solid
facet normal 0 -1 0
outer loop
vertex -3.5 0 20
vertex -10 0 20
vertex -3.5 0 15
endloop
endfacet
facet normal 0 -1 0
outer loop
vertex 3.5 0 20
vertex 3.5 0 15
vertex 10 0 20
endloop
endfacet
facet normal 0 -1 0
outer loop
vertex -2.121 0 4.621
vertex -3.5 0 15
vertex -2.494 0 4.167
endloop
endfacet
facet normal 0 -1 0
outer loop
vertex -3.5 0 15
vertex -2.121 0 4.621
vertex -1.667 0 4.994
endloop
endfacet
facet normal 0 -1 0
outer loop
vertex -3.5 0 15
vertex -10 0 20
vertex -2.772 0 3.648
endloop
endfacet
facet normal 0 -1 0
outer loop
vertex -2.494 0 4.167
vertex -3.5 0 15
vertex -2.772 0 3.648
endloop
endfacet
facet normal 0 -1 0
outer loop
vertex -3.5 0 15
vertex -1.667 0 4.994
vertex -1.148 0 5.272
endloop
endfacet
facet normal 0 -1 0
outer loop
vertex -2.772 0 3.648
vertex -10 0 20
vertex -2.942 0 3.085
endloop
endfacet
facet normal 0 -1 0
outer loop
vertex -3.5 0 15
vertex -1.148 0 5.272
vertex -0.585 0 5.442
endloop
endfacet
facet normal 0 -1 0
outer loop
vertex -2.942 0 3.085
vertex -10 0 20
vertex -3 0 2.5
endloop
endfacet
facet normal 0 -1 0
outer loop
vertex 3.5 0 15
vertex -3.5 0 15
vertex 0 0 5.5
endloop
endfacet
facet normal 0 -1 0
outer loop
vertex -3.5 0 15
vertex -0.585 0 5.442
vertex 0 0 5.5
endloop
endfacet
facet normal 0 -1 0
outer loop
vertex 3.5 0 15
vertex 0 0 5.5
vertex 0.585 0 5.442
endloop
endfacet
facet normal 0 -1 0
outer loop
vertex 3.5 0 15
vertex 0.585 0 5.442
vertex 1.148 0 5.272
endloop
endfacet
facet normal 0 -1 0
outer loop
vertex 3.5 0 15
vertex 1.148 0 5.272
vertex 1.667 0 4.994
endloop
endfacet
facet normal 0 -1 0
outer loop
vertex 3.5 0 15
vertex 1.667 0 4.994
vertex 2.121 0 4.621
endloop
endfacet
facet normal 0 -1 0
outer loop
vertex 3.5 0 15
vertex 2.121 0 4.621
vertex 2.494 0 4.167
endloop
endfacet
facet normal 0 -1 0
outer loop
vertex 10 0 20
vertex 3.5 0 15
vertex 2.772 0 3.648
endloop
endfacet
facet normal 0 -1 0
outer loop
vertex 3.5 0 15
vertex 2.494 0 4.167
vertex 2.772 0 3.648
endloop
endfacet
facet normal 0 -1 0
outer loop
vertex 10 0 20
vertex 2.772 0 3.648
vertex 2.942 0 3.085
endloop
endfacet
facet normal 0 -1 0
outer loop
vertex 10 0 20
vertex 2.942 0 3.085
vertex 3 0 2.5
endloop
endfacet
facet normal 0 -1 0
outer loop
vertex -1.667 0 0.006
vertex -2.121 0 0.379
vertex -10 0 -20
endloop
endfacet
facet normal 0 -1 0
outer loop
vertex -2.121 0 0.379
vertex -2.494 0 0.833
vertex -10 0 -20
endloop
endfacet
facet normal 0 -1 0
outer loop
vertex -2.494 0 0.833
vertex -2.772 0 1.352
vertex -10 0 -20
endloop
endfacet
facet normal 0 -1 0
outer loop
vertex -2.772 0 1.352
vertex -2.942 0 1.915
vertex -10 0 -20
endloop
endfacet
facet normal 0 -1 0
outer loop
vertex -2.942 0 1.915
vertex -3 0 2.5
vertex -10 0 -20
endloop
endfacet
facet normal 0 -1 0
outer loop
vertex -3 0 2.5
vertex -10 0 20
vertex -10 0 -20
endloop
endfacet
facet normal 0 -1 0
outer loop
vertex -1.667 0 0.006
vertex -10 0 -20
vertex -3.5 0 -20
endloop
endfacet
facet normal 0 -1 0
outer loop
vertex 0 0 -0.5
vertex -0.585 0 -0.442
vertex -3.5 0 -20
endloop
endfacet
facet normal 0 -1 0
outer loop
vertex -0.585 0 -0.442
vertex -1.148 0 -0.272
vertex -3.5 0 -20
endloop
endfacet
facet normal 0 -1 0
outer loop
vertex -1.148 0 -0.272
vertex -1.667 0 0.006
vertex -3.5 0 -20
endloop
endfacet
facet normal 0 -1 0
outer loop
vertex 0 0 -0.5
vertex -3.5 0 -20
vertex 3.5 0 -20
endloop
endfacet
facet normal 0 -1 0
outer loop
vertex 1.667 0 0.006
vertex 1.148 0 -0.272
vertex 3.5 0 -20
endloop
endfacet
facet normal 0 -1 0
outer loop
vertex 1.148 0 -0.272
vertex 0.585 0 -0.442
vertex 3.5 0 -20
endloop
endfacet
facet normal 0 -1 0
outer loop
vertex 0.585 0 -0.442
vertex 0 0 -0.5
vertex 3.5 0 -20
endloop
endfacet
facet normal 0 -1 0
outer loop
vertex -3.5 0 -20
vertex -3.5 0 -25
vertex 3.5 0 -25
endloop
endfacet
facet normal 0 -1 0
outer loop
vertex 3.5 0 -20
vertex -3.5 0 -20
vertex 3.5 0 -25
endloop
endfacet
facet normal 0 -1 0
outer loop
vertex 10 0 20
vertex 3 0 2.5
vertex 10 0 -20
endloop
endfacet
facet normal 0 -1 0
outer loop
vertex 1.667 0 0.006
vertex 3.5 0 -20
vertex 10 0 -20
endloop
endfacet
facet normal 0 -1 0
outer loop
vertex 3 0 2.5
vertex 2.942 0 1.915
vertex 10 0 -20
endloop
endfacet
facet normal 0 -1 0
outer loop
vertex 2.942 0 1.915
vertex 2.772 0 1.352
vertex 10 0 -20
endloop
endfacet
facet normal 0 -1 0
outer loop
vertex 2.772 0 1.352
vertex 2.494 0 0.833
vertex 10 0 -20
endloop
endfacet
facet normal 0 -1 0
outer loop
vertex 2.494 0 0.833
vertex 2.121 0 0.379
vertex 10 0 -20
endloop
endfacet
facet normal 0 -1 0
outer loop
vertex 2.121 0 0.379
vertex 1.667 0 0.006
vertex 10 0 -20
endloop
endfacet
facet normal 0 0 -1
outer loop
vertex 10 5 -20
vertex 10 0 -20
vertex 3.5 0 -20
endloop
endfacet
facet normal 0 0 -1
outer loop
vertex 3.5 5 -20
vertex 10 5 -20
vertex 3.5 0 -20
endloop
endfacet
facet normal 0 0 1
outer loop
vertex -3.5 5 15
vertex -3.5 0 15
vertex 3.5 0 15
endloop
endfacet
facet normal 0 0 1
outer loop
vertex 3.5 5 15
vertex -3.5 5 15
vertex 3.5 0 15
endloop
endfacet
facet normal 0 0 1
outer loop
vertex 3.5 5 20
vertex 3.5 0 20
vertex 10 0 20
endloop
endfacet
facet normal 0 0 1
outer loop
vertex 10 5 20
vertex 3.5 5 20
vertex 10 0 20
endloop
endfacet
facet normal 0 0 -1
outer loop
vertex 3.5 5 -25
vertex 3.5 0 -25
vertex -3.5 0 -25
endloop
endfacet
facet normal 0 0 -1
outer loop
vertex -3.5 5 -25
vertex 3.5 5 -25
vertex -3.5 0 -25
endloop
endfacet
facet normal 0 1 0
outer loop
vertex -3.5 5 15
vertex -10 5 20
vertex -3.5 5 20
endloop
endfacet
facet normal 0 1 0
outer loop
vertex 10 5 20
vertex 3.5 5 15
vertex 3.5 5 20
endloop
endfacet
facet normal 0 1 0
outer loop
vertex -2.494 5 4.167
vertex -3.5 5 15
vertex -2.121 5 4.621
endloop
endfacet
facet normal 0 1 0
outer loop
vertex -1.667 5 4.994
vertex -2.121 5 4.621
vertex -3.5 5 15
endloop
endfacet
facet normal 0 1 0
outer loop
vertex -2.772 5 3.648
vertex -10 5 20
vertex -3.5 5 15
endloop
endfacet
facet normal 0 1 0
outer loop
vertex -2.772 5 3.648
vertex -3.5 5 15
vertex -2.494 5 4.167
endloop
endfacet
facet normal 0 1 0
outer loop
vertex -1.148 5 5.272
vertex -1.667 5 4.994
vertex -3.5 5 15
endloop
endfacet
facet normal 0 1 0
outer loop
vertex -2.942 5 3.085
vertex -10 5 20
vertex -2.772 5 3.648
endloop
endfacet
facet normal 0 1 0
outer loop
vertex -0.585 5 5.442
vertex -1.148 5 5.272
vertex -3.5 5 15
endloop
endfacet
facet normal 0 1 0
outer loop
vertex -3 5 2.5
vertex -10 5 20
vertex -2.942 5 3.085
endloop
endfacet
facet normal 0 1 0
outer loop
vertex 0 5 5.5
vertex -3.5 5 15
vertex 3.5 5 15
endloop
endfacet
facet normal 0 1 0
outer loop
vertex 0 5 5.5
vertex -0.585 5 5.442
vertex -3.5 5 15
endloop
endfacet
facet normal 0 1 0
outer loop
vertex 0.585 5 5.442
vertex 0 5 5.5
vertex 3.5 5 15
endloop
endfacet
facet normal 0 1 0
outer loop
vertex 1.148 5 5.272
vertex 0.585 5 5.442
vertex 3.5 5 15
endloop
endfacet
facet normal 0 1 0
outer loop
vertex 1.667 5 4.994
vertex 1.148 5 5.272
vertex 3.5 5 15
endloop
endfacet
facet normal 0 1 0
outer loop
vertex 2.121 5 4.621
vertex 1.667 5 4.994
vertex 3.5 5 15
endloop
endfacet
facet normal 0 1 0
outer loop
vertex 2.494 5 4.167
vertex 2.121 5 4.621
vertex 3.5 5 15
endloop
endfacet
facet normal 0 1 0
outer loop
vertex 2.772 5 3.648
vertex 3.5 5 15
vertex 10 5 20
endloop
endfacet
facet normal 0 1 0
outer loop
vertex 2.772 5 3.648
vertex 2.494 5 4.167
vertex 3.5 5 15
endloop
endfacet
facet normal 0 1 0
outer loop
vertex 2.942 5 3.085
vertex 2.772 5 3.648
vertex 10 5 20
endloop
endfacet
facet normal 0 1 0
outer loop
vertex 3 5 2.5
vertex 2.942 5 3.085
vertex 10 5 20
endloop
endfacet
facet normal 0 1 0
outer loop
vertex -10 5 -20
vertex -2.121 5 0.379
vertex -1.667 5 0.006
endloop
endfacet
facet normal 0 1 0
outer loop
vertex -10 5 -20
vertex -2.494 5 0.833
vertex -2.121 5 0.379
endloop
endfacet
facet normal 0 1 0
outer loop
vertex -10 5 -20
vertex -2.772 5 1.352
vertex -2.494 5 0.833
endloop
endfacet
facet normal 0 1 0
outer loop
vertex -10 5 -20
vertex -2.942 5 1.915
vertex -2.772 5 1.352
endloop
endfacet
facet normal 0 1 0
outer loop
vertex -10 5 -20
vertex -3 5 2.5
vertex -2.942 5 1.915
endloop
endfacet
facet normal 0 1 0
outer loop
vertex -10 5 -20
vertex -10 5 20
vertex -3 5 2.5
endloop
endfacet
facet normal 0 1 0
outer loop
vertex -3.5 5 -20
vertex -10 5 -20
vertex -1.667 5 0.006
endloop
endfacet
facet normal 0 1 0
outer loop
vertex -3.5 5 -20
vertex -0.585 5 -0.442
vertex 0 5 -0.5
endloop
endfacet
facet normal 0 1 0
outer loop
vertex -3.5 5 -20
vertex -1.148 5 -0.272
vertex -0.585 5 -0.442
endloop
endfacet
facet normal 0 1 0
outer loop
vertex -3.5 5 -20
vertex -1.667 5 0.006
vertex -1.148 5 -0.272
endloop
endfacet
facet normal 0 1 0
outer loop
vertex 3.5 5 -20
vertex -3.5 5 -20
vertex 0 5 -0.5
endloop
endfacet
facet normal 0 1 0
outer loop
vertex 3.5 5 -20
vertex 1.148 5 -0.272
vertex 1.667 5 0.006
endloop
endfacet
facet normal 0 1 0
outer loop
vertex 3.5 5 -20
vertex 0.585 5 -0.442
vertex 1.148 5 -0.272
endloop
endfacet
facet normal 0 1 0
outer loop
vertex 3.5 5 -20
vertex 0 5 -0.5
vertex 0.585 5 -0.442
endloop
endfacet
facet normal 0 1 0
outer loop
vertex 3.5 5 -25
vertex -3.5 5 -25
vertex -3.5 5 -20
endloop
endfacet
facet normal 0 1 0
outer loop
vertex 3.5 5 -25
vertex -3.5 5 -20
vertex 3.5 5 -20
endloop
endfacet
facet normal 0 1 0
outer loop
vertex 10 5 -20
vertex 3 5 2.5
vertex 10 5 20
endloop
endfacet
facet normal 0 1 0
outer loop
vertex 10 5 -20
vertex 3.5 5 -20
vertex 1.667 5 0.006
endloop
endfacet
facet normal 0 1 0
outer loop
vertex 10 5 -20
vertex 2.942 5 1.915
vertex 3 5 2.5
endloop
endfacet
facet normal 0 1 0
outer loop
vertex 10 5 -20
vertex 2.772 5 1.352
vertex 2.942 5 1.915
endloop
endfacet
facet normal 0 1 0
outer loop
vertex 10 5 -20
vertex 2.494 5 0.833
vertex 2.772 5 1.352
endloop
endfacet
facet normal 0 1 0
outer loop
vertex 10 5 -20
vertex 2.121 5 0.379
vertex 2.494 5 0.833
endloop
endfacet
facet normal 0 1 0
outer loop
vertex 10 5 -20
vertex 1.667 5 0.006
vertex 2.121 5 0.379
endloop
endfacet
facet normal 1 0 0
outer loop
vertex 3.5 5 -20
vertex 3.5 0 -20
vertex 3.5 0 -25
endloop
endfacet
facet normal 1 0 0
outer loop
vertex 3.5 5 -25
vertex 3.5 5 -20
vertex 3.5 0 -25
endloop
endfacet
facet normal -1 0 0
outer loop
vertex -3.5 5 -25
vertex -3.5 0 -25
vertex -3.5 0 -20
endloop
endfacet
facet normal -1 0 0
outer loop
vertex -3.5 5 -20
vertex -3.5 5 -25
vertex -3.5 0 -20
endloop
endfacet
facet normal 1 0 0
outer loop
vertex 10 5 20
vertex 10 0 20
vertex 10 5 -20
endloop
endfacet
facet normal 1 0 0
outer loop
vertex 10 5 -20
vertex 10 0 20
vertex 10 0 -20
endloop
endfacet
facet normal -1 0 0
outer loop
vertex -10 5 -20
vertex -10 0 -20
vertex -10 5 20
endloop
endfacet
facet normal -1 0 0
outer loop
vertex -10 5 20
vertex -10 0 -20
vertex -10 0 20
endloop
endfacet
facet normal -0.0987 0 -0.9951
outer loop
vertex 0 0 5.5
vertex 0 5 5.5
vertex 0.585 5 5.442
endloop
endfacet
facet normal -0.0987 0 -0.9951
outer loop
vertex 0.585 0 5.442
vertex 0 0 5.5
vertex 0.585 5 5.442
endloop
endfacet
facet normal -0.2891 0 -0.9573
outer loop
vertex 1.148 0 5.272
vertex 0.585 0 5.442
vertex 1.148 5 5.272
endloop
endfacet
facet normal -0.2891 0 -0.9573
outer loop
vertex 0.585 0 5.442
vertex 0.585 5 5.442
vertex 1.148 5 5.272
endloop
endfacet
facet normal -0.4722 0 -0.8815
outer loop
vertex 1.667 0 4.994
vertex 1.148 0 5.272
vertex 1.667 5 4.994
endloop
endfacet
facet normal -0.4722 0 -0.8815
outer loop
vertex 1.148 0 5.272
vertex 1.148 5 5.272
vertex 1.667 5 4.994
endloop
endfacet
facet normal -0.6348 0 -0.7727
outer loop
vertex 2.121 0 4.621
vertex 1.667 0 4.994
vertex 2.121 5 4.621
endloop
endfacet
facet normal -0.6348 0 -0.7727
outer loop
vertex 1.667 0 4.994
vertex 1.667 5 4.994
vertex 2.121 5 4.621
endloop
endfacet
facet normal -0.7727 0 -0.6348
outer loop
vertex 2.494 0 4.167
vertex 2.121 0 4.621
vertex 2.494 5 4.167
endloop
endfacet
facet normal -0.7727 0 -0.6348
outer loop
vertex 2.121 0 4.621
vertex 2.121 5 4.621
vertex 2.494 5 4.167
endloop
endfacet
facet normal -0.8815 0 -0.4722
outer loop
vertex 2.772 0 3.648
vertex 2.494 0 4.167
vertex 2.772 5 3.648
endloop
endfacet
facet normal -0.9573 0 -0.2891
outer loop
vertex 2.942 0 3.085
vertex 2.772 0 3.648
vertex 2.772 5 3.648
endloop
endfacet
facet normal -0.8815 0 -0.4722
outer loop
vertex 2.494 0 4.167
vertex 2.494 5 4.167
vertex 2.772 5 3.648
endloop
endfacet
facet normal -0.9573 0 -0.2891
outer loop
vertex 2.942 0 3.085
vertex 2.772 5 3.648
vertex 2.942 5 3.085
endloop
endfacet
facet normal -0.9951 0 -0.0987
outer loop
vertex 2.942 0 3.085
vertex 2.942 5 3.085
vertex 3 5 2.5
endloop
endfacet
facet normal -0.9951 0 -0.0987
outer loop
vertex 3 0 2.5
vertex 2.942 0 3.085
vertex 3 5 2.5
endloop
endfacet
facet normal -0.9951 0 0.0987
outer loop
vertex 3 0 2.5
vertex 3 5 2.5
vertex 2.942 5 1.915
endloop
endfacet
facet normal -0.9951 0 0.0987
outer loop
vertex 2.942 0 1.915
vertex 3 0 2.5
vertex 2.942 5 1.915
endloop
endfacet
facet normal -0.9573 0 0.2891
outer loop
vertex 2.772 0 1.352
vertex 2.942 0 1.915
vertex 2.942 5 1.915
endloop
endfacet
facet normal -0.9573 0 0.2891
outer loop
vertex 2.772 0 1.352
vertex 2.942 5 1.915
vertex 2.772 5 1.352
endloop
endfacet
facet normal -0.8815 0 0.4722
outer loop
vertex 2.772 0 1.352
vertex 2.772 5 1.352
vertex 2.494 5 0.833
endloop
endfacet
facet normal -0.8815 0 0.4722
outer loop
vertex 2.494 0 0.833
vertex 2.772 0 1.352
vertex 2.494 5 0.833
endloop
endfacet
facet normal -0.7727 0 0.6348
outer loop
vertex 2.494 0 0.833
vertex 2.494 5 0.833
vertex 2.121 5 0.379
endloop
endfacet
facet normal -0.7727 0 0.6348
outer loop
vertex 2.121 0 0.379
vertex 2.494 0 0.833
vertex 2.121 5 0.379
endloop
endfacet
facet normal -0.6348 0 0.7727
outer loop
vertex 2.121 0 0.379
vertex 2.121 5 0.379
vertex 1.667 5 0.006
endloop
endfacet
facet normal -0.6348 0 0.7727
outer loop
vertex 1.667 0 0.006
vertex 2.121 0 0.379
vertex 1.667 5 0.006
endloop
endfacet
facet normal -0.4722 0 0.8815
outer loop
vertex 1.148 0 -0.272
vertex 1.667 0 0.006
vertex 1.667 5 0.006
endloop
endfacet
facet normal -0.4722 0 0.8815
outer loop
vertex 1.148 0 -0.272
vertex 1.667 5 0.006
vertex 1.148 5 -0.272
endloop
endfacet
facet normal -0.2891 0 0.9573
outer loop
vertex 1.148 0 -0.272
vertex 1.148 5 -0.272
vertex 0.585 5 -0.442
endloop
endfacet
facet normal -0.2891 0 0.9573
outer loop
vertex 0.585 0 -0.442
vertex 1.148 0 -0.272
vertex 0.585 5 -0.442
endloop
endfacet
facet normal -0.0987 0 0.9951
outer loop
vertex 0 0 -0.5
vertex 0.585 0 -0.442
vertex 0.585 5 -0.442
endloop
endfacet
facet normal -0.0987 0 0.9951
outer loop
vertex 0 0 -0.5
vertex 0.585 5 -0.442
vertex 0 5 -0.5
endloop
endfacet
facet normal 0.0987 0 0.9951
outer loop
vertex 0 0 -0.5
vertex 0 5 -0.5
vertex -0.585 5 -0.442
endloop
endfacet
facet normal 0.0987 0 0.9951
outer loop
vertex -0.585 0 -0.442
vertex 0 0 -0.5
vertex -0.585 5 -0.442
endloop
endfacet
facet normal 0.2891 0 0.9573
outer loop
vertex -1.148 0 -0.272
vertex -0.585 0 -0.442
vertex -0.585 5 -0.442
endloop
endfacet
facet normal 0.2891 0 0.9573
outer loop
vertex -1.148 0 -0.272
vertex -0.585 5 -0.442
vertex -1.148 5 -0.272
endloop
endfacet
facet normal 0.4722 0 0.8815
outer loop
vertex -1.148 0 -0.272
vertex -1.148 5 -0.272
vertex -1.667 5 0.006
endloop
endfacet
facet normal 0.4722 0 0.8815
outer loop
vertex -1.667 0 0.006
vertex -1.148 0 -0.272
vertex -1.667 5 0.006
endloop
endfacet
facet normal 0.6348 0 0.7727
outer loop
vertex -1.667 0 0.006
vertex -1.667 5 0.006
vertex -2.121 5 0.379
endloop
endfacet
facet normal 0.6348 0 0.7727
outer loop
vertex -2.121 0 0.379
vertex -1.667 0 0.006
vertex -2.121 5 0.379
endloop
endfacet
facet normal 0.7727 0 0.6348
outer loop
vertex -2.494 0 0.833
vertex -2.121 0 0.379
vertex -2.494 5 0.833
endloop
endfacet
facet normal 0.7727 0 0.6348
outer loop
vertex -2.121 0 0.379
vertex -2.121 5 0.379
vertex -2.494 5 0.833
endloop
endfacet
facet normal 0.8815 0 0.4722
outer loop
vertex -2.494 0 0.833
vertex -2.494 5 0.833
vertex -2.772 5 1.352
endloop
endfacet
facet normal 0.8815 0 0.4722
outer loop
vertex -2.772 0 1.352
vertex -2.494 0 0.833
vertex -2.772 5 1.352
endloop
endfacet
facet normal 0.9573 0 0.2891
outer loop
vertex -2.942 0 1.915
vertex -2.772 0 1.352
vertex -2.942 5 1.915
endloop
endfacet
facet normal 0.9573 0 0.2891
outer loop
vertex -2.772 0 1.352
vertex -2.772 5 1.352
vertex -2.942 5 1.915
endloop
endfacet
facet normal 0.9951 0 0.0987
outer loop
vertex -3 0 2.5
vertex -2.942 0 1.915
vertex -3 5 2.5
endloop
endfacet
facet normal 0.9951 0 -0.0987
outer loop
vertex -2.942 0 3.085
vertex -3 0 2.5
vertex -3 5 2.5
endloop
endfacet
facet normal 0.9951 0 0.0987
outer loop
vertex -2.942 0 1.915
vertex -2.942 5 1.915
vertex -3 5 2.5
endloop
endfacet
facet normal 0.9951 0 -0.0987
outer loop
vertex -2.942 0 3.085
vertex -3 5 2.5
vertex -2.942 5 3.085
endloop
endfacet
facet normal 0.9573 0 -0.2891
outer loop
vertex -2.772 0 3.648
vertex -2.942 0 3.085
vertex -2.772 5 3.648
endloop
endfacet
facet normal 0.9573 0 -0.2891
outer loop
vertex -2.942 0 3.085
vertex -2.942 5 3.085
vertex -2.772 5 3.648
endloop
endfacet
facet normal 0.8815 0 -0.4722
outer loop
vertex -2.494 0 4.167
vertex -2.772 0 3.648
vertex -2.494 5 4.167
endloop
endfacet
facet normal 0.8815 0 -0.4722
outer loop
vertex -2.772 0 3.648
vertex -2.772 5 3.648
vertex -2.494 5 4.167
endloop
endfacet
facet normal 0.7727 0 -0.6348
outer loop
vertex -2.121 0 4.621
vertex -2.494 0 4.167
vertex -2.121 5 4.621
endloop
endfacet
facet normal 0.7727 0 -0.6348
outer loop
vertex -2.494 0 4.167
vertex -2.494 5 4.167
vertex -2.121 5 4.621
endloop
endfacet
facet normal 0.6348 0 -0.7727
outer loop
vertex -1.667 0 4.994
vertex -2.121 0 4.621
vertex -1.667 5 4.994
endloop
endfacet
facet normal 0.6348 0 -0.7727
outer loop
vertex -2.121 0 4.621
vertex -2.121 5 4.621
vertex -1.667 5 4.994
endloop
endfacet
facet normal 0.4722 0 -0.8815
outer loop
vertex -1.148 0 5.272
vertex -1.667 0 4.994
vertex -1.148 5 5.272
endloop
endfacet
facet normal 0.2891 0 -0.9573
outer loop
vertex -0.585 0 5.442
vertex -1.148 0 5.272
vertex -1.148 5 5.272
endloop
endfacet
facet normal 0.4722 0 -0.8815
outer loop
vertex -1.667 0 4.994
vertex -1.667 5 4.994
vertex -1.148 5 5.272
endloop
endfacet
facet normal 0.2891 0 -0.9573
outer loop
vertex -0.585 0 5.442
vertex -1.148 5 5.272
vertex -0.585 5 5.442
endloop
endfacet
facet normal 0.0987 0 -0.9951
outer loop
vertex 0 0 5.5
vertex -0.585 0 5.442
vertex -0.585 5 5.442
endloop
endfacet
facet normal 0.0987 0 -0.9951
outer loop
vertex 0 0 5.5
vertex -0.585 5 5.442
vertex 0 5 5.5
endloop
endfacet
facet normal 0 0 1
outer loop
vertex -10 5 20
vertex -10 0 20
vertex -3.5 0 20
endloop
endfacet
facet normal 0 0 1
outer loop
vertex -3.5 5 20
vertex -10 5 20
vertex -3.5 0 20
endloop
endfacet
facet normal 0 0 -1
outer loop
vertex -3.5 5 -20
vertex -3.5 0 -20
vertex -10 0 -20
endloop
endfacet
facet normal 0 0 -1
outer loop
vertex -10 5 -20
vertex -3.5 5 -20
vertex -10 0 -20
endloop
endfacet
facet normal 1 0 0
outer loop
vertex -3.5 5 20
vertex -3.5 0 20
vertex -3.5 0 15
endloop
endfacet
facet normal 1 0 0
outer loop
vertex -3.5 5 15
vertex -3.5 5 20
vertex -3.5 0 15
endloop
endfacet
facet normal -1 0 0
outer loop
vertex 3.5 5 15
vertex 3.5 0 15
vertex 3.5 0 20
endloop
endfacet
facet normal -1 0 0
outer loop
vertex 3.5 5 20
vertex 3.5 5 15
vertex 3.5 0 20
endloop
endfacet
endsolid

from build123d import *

# Parameters (mm, degrees)
BOSS_EXTRUDE1_DEPTH = 5
SKETCH2_R           = 3
CUT_EXTRUDE1_DEPTH  = 10


with BuildPart() as part:
    # Sketch1 → Boss-Extrude1 (new body)
    with BuildSketch(Plane(origin=(0, 0, 0), x_dir=(1, 0, 0), z_dir=(0, 1, 0))):
        Polygon((-10, 20), (-10, -20), (-3.5, -20), (-3.5, -15), (3.5, -15), (3.5, -20), (10, -20), (10, 20), (3.5, 20), (3.5, 25), (-3.5, 25), (-3.5, 20), align=None)
    extrude(amount=BOSS_EXTRUDE1_DEPTH)

    # Sketch2 → Cut-Extrude1 (cut)
    with BuildSketch(Plane(origin=(0, 5, 0), x_dir=(1, 0, 0), z_dir=(0, 1, 0))):
        with Locations(Location((0, -2.5, 0), (0, 0, 270))):
            Circle(SKETCH2_R)
    extrude(amount=-CUT_EXTRUDE1_DEPTH, mode=Mode.SUBTRACT)


solid = part.part
